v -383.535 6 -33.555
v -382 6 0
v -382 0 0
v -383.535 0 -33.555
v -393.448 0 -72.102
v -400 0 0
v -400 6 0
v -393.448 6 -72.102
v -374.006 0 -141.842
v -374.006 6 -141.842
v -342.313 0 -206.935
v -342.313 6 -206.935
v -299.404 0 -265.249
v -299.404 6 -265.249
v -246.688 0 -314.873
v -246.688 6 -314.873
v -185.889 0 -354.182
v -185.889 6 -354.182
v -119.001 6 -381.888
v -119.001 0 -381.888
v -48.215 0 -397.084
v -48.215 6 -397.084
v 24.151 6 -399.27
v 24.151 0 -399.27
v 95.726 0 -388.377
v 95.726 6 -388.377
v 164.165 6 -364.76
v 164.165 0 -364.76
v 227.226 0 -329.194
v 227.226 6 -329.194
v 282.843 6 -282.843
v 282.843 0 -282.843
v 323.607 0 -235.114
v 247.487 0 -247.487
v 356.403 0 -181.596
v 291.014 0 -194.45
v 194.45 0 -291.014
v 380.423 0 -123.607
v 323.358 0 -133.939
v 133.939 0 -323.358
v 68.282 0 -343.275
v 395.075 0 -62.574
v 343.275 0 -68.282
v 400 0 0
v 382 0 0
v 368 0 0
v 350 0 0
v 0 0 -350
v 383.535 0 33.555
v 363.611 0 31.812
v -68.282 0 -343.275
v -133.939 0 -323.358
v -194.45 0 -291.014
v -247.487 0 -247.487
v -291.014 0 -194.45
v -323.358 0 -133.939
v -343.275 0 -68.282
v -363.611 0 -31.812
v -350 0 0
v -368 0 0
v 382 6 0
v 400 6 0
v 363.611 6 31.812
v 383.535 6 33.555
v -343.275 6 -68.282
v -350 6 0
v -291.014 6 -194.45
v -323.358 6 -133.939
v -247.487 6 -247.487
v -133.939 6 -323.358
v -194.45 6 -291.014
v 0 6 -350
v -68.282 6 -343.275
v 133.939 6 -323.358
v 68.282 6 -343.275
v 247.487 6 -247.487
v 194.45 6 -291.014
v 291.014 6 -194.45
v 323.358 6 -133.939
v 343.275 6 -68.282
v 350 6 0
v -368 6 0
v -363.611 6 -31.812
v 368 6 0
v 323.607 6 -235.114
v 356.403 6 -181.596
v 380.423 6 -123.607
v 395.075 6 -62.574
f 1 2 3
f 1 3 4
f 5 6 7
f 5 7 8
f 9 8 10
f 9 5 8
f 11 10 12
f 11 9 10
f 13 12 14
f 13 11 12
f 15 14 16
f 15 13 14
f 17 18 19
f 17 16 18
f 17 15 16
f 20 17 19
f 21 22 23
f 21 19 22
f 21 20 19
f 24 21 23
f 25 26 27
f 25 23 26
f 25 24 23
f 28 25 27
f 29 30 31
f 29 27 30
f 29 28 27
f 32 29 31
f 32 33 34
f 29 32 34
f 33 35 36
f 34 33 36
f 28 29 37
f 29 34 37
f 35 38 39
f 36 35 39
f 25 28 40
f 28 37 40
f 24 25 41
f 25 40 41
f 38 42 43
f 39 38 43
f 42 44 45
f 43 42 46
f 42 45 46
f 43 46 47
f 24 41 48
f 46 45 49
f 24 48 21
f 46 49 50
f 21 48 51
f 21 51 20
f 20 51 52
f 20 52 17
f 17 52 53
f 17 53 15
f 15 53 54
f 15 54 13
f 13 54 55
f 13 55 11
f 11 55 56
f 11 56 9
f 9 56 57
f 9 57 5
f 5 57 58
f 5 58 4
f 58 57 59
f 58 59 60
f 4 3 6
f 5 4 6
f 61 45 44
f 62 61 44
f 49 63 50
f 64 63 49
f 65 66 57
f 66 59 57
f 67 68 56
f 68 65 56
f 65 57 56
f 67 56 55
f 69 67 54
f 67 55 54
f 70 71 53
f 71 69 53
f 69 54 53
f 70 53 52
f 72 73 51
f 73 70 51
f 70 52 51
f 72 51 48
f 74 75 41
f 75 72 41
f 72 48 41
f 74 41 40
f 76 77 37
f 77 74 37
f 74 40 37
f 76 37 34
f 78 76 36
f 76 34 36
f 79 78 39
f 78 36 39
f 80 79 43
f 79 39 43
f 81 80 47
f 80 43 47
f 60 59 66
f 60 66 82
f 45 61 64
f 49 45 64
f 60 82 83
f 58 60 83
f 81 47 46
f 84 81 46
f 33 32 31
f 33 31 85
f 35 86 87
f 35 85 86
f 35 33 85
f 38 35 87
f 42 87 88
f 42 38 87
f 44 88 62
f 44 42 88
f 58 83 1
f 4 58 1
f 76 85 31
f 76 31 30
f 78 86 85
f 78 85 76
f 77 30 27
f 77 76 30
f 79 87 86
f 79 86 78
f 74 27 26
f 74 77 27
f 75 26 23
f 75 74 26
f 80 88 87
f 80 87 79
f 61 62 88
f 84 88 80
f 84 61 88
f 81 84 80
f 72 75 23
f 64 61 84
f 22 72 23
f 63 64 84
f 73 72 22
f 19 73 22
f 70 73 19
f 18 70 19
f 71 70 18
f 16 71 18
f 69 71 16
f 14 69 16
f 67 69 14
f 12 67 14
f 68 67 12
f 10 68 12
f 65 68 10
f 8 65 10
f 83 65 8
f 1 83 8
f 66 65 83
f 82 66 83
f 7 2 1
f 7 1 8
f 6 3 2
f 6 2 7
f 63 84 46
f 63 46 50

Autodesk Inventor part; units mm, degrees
ref_plane "YZ Plane" through (0, 0, 0) normal (1, 0, 0) x (0, 1, 0)
ref_plane "XZ Plane" through (0, 0, 0) normal (0, 1, 0) x (-1, 0, 0)
ref_plane "XY Plane" through (0, 0, 0) normal (0, 0, 1) x (1, 0, 0)
sketch "Esboço1" plane through (0, 0, 0) normal (0, 1, 0) x (-1, 0, 0)
  arc A0 (-350, 0) -> (-247.4874, -247.4874) centre (0, 0) ccw
  arc A1 (-400, 0) -> (-282.8427, -282.8427) centre (0, 0) ccw
  circle A2 centre (0, 0) radius 400
  circle A3 centre (0, 0) radius 350
  line L0 (0, 0) -> (576.9105, 0)
  line L1 (0, 0) -> (-1224.3013, 0) construction
  line L2 (-350, 0) -> (-400, 0)
  point P0 (-282.8427, -282.8427)
  point P1 (-247.4874, -247.4874)
  point P2 (-282.8427, -282.8427)
  point P3 (400, 0)
  point P4 (350, 0)
  point P5 (-247.4874, -247.4874)
  dimension "d27" = 700
  dimension "d28" = 800
  dimension "d87" = 180
extrude "Extrusão1" add sketch "Esboço1" along normal blind 6 contours A0 A3 L0 A2 A1 L2
sketch "Esboço5" plane through (0, 6, 0) normal (0, 1, 0) x (1, 0, 0)
  arc A0 (400, 0) -> (-400, 0) centre (0, 0) ccw projected
  line L0 (-400, 0) -> (-350, 0) projected
  line L1 (0, 0) -> (-469.4096, 41.068)
  circle A1 centre (0, 0) radius 400
  arc A2 (350, 0) -> (-350, 0) centre (0, 0) ccw projected
  circle A3 centre (0, 0) radius 350
  line L2 (-400, 0) -> (-382, 0)
  line L3 (-382, 0) -> (-368, 0)
  line L4 (-398.4779, 34.8623) -> (-383.535, 33.555)
  line L5 (-383.535, 33.555) -> (-363.6111, 31.8118)
  line L6 (-382, 0) -> (-383.535, 33.555)
  line L7 (-368, 0) -> (-363.6111, 31.8118)
  point P0 (-348.6681, 30.5045)
  point P1 (-398.4779, 34.8623)
  point P2 (-348.6681, 30.5045)
  point P3 (-400, 0)
  dimension "d98" = -5
  dimension "d99" = 18
  dimension "d100" = 14
  dimension "d101" = 15
  dimension "d102" = 20
extrude "Extrusão5" cut sketch "Esboço5" against normal up to surface (6 mm away) contours L1 L7 L0 L6
sketch "Esboço6" plane through (0, 6, 0) normal (0, 1, 0) x (1, 0, 0)
  arc A0 (400, 0) -> (-400, 0) centre (0, 0) ccw projected
  circle A1 centre (0, 0) radius 400
  circle A2 centre (0, 0) radius 350
  line L0 (0, 0) -> (512.6153, -44.848)
  line L1 (350, 0) -> (400, 0) projected
  line L2 (350, 0) -> (368, 0)
  line L3 (368, 0) -> (382, 0)
  line L4 (382, 0) -> (400, 0)
  line L5 (348.6681, -30.5045) -> (363.6111, -31.8118)
  line L6 (363.6111, -31.8118) -> (383.535, -33.555)
  line L7 (383.535, -33.555) -> (398.4779, -34.8623)
  line L8 (368, 0) -> (363.6111, -31.8118)
  line L9 (382, 0) -> (383.535, -33.555)
  point P0 (-398.4779, 34.8623)
  dimension "d93" = 5
  dimension "d94" = 18
  dimension "d95" = 14
  dimension "d96" = 15
  dimension "d97" = 20
extrude "Extrusão6" add sketch "Esboço6" against normal up to surface (6 mm away) contours L9 L0 L8 L1
properties part number "base"
